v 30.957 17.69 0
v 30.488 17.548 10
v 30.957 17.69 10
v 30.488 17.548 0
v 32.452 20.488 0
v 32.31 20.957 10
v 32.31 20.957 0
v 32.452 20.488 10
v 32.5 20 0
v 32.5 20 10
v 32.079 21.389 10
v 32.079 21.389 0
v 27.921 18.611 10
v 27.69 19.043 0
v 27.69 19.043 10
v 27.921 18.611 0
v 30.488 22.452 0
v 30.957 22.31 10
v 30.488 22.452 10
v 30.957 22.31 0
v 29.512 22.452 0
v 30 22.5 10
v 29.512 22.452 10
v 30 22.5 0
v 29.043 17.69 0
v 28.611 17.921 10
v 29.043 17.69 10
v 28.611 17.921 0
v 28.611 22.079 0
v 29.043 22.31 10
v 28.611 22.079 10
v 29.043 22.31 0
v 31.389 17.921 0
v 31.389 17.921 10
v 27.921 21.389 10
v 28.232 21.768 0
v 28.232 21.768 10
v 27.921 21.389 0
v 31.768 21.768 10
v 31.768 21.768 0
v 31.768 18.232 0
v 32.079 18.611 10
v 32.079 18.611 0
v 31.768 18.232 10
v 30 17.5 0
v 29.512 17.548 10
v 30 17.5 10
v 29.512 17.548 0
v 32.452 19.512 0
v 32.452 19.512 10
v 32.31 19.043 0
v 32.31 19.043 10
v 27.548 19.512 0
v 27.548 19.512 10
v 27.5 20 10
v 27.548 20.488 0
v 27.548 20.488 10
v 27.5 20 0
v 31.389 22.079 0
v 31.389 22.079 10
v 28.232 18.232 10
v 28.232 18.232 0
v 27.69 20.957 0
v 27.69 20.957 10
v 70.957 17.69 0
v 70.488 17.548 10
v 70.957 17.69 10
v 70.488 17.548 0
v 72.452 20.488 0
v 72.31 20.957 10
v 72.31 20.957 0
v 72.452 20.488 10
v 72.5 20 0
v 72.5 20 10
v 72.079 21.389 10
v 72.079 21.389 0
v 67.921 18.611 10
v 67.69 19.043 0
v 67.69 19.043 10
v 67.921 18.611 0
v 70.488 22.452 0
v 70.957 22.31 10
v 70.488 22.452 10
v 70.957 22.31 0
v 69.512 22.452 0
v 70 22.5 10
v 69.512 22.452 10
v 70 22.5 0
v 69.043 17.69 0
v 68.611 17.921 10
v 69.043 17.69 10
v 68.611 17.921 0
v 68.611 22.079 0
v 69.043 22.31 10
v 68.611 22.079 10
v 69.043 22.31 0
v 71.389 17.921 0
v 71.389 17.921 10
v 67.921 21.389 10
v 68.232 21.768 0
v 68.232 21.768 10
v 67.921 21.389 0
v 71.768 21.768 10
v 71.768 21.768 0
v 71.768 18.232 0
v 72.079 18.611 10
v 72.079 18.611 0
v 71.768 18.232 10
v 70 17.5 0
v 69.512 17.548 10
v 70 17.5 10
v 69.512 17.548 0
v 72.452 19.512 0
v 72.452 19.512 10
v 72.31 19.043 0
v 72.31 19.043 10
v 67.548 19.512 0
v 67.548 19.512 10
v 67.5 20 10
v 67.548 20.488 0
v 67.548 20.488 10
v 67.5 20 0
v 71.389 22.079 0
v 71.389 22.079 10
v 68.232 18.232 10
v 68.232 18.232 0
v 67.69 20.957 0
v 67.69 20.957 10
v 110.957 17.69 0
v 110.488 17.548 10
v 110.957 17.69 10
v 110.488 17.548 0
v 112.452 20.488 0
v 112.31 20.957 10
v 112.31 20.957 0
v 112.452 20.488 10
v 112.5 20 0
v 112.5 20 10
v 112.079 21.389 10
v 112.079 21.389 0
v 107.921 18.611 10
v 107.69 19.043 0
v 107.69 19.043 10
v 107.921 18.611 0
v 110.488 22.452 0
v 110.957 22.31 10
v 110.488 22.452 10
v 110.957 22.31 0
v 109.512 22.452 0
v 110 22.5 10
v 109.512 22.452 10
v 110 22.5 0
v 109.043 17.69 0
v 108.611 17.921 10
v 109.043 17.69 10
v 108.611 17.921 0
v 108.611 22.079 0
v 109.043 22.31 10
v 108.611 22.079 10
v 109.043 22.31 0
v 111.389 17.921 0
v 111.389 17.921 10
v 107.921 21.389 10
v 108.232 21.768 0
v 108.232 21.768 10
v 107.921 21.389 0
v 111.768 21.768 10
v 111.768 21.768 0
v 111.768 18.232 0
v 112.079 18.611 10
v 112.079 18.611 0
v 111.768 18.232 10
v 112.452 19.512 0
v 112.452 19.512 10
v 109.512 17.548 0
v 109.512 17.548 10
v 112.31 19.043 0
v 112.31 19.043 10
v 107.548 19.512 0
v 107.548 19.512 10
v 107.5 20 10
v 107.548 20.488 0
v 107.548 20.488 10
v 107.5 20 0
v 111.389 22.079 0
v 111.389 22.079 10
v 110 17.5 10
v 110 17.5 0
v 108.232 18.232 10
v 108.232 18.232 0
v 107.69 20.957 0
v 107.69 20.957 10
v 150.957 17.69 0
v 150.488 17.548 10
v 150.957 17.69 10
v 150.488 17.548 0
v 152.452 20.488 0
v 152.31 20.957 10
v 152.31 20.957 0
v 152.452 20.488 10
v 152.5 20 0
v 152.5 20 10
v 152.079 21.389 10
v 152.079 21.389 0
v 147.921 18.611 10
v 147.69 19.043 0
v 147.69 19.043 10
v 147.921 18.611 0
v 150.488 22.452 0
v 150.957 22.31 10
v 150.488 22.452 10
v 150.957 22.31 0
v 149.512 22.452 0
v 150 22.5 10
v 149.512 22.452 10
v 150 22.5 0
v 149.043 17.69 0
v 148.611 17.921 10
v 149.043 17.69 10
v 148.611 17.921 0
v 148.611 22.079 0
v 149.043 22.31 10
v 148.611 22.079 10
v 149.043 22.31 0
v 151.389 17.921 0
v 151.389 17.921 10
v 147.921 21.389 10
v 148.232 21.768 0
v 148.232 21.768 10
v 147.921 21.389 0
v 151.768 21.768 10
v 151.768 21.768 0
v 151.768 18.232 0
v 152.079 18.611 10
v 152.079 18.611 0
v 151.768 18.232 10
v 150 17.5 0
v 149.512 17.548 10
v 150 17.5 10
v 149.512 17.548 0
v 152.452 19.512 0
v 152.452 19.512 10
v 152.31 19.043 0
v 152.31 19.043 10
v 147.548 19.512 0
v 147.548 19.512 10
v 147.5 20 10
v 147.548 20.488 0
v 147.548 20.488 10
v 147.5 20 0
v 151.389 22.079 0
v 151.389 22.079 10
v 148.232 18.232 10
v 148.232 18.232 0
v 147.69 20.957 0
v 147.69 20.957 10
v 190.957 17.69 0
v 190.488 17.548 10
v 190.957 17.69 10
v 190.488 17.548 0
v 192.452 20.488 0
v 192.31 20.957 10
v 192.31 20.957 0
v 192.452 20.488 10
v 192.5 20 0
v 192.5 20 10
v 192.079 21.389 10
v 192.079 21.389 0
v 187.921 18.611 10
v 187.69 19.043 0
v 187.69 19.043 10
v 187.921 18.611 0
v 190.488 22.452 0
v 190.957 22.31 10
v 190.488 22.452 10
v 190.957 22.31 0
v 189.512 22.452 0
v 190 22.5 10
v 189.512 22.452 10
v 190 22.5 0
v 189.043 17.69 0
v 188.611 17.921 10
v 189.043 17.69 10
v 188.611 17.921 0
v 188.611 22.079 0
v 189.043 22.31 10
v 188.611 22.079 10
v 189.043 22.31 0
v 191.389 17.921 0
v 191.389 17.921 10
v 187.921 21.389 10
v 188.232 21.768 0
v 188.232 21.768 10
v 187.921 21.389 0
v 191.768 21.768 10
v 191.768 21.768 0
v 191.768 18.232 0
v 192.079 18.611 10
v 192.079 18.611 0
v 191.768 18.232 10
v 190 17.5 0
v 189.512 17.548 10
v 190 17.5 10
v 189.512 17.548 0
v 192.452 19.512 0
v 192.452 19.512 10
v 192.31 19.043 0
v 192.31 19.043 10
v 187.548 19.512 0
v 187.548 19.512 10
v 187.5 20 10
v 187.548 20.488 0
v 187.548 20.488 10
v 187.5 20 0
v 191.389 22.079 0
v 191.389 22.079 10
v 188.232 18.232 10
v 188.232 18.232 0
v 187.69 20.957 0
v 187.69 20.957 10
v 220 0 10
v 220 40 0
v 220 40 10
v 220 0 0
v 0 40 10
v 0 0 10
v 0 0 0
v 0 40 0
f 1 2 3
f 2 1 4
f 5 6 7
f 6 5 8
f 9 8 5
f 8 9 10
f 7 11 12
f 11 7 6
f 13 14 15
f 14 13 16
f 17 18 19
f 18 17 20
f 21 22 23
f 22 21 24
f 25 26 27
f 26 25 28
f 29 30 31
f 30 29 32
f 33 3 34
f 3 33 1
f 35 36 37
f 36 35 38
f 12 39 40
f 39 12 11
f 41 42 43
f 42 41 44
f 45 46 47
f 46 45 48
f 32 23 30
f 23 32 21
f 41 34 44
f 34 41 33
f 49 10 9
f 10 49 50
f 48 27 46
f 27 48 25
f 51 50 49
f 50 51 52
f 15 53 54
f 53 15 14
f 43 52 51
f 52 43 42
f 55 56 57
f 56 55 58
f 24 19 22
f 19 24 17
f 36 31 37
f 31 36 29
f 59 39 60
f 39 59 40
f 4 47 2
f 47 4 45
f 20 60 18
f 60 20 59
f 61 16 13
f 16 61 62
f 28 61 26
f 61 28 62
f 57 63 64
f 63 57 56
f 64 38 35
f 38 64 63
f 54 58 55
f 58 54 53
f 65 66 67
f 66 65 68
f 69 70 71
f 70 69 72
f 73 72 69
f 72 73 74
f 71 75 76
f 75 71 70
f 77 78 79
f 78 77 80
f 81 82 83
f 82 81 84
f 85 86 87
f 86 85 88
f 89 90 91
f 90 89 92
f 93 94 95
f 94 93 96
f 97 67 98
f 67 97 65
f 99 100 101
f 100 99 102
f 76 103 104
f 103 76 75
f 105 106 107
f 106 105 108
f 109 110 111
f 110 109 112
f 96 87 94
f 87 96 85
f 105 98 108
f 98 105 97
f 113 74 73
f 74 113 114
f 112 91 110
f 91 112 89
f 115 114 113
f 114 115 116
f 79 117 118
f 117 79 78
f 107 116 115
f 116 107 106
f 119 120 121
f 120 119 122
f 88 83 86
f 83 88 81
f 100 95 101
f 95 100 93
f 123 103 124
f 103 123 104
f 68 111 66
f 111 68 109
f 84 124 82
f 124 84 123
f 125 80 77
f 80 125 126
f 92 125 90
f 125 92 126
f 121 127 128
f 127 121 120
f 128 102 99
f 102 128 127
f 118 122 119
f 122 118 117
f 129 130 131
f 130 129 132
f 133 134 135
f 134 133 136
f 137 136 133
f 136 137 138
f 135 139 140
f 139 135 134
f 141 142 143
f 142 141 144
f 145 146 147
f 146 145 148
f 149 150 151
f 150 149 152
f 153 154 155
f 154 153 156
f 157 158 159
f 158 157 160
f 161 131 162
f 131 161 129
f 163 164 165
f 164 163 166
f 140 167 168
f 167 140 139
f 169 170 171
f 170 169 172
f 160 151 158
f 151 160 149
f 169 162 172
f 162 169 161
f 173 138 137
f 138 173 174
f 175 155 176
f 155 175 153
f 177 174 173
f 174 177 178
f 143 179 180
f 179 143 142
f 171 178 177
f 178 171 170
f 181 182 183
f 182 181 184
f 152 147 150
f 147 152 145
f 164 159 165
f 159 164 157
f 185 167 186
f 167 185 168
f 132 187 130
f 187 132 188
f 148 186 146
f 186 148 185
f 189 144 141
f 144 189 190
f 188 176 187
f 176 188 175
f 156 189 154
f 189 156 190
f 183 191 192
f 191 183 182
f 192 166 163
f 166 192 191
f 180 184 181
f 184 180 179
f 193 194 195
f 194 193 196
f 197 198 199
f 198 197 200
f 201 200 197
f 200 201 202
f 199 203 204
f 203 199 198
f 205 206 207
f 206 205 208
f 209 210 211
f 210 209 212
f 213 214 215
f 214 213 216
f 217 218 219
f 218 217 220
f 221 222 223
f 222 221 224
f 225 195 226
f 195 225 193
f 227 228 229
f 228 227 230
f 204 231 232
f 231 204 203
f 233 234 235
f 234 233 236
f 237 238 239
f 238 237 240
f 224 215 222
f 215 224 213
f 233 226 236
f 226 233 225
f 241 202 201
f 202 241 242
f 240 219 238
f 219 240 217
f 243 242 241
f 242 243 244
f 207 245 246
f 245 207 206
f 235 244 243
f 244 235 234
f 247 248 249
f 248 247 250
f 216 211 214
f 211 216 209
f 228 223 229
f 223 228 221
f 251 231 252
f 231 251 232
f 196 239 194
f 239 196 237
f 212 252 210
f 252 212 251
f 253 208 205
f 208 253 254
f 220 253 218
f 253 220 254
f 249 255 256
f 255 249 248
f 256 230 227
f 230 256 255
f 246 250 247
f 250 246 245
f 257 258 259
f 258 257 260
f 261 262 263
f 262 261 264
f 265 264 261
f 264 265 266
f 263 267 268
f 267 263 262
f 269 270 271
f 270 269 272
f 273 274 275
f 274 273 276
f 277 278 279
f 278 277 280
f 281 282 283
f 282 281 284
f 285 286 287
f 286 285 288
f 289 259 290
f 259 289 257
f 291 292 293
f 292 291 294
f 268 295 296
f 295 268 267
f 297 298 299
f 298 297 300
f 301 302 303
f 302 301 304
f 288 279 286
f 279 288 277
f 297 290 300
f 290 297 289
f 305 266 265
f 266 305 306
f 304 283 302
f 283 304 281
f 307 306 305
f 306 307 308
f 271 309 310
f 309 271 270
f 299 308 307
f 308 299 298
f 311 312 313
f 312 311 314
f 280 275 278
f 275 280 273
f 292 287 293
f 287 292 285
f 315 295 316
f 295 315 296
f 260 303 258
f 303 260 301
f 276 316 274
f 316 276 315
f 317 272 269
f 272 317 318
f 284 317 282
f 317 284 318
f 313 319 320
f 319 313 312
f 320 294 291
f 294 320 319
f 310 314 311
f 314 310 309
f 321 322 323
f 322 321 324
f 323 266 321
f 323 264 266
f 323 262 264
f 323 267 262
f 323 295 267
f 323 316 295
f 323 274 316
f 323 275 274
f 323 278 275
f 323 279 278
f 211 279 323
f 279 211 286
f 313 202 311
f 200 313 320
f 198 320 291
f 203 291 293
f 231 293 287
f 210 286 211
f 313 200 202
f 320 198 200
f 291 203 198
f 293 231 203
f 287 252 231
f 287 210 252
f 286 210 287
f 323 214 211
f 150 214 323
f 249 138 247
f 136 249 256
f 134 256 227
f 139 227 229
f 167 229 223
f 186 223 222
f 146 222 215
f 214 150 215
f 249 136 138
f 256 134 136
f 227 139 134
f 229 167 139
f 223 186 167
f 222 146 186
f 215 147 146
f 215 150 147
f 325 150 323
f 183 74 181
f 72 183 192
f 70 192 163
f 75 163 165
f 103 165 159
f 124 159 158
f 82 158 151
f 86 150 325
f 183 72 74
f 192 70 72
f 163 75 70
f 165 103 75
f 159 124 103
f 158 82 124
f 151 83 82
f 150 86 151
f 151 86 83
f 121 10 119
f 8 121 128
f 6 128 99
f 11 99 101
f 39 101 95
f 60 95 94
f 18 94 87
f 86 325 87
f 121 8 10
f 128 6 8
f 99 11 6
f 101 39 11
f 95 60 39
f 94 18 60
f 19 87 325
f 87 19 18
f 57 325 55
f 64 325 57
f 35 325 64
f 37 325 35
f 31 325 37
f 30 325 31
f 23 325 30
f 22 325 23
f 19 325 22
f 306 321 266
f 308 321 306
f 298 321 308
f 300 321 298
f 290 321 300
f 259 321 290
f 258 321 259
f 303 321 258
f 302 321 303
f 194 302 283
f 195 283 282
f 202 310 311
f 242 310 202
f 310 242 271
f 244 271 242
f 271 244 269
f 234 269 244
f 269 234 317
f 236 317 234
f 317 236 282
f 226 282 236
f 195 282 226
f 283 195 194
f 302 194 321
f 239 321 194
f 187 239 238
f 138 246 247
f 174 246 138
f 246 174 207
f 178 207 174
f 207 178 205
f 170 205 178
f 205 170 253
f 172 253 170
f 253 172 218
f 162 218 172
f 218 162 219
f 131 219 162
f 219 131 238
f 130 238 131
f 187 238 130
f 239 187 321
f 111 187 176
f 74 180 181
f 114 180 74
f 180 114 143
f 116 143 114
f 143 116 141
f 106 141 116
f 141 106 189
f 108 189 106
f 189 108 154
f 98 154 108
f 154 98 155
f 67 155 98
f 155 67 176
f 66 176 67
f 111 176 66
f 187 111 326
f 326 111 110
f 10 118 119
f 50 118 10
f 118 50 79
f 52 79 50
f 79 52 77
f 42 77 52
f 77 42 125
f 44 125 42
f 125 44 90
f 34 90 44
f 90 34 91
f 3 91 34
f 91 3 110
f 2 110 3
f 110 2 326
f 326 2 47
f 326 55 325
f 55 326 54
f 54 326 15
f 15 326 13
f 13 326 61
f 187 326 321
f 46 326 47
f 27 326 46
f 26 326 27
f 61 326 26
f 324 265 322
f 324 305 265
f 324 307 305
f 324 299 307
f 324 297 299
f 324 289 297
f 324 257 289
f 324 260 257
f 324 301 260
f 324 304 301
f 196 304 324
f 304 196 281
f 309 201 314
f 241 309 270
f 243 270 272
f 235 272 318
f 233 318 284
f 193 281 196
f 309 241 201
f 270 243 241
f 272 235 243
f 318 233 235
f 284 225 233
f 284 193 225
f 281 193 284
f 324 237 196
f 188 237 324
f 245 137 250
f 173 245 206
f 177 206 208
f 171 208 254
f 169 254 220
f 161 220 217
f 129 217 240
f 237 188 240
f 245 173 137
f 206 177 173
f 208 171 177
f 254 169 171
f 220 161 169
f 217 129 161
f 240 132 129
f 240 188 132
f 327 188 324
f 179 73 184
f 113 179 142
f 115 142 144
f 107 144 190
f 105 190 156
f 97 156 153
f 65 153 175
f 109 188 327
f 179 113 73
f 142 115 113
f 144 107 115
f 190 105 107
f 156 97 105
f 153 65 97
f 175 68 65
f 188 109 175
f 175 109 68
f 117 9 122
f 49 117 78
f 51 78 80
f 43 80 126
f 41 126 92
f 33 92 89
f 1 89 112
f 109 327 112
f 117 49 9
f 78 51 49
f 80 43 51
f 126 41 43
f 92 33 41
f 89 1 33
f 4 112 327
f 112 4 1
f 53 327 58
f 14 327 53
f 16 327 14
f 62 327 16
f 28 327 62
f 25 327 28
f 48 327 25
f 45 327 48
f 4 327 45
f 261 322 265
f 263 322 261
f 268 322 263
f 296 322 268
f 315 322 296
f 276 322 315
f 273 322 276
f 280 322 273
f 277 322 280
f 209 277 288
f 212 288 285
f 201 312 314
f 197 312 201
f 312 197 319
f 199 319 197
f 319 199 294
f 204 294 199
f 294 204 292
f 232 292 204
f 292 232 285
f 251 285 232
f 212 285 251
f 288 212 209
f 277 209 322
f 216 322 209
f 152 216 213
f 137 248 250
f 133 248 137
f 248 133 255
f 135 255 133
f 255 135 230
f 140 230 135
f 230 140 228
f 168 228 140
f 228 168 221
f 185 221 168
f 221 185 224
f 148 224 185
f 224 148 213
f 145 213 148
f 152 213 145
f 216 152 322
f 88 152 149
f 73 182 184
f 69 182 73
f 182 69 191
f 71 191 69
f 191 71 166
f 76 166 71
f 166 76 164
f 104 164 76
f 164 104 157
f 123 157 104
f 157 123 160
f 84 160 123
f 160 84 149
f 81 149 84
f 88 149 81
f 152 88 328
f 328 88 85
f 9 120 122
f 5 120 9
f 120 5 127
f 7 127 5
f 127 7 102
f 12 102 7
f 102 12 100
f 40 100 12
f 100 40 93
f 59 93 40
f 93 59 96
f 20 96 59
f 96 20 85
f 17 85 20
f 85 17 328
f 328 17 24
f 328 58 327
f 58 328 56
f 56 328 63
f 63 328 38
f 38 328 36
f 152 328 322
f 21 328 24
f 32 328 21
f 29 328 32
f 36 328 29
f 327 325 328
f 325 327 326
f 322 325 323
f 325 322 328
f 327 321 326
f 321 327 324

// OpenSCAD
$fn = 32;

// ----------------------------------------------------------------------
// Long rail: 200-250 mm mounting rail
// ----------------------------------------------------------------------

// --- parameters (mm) ---
rail_l = 220;             // rail length, X
rail_w = 40;              // rail width, Y
rail_t = 10;              // rail thickness, Z
hole_d = 5;               // mounting hole diameter
hole_start = 30;          // first hole offset from the end
hole_pitch = 40;          // hole pitch
holes = 5;                // number of holes
fit_tol = 0.1;            // tolerance for press fits, mm
free_tol = 0.3;           // tolerance for clearance fits, mm

difference() {
  cube([rail_l, rail_w, rail_t]);
  for (i = [0 : holes - 1])
    translate([hole_start + i * hole_pitch, rail_w / 2, -1])
      cylinder(h = rail_t + 2, d = hole_d);
}
